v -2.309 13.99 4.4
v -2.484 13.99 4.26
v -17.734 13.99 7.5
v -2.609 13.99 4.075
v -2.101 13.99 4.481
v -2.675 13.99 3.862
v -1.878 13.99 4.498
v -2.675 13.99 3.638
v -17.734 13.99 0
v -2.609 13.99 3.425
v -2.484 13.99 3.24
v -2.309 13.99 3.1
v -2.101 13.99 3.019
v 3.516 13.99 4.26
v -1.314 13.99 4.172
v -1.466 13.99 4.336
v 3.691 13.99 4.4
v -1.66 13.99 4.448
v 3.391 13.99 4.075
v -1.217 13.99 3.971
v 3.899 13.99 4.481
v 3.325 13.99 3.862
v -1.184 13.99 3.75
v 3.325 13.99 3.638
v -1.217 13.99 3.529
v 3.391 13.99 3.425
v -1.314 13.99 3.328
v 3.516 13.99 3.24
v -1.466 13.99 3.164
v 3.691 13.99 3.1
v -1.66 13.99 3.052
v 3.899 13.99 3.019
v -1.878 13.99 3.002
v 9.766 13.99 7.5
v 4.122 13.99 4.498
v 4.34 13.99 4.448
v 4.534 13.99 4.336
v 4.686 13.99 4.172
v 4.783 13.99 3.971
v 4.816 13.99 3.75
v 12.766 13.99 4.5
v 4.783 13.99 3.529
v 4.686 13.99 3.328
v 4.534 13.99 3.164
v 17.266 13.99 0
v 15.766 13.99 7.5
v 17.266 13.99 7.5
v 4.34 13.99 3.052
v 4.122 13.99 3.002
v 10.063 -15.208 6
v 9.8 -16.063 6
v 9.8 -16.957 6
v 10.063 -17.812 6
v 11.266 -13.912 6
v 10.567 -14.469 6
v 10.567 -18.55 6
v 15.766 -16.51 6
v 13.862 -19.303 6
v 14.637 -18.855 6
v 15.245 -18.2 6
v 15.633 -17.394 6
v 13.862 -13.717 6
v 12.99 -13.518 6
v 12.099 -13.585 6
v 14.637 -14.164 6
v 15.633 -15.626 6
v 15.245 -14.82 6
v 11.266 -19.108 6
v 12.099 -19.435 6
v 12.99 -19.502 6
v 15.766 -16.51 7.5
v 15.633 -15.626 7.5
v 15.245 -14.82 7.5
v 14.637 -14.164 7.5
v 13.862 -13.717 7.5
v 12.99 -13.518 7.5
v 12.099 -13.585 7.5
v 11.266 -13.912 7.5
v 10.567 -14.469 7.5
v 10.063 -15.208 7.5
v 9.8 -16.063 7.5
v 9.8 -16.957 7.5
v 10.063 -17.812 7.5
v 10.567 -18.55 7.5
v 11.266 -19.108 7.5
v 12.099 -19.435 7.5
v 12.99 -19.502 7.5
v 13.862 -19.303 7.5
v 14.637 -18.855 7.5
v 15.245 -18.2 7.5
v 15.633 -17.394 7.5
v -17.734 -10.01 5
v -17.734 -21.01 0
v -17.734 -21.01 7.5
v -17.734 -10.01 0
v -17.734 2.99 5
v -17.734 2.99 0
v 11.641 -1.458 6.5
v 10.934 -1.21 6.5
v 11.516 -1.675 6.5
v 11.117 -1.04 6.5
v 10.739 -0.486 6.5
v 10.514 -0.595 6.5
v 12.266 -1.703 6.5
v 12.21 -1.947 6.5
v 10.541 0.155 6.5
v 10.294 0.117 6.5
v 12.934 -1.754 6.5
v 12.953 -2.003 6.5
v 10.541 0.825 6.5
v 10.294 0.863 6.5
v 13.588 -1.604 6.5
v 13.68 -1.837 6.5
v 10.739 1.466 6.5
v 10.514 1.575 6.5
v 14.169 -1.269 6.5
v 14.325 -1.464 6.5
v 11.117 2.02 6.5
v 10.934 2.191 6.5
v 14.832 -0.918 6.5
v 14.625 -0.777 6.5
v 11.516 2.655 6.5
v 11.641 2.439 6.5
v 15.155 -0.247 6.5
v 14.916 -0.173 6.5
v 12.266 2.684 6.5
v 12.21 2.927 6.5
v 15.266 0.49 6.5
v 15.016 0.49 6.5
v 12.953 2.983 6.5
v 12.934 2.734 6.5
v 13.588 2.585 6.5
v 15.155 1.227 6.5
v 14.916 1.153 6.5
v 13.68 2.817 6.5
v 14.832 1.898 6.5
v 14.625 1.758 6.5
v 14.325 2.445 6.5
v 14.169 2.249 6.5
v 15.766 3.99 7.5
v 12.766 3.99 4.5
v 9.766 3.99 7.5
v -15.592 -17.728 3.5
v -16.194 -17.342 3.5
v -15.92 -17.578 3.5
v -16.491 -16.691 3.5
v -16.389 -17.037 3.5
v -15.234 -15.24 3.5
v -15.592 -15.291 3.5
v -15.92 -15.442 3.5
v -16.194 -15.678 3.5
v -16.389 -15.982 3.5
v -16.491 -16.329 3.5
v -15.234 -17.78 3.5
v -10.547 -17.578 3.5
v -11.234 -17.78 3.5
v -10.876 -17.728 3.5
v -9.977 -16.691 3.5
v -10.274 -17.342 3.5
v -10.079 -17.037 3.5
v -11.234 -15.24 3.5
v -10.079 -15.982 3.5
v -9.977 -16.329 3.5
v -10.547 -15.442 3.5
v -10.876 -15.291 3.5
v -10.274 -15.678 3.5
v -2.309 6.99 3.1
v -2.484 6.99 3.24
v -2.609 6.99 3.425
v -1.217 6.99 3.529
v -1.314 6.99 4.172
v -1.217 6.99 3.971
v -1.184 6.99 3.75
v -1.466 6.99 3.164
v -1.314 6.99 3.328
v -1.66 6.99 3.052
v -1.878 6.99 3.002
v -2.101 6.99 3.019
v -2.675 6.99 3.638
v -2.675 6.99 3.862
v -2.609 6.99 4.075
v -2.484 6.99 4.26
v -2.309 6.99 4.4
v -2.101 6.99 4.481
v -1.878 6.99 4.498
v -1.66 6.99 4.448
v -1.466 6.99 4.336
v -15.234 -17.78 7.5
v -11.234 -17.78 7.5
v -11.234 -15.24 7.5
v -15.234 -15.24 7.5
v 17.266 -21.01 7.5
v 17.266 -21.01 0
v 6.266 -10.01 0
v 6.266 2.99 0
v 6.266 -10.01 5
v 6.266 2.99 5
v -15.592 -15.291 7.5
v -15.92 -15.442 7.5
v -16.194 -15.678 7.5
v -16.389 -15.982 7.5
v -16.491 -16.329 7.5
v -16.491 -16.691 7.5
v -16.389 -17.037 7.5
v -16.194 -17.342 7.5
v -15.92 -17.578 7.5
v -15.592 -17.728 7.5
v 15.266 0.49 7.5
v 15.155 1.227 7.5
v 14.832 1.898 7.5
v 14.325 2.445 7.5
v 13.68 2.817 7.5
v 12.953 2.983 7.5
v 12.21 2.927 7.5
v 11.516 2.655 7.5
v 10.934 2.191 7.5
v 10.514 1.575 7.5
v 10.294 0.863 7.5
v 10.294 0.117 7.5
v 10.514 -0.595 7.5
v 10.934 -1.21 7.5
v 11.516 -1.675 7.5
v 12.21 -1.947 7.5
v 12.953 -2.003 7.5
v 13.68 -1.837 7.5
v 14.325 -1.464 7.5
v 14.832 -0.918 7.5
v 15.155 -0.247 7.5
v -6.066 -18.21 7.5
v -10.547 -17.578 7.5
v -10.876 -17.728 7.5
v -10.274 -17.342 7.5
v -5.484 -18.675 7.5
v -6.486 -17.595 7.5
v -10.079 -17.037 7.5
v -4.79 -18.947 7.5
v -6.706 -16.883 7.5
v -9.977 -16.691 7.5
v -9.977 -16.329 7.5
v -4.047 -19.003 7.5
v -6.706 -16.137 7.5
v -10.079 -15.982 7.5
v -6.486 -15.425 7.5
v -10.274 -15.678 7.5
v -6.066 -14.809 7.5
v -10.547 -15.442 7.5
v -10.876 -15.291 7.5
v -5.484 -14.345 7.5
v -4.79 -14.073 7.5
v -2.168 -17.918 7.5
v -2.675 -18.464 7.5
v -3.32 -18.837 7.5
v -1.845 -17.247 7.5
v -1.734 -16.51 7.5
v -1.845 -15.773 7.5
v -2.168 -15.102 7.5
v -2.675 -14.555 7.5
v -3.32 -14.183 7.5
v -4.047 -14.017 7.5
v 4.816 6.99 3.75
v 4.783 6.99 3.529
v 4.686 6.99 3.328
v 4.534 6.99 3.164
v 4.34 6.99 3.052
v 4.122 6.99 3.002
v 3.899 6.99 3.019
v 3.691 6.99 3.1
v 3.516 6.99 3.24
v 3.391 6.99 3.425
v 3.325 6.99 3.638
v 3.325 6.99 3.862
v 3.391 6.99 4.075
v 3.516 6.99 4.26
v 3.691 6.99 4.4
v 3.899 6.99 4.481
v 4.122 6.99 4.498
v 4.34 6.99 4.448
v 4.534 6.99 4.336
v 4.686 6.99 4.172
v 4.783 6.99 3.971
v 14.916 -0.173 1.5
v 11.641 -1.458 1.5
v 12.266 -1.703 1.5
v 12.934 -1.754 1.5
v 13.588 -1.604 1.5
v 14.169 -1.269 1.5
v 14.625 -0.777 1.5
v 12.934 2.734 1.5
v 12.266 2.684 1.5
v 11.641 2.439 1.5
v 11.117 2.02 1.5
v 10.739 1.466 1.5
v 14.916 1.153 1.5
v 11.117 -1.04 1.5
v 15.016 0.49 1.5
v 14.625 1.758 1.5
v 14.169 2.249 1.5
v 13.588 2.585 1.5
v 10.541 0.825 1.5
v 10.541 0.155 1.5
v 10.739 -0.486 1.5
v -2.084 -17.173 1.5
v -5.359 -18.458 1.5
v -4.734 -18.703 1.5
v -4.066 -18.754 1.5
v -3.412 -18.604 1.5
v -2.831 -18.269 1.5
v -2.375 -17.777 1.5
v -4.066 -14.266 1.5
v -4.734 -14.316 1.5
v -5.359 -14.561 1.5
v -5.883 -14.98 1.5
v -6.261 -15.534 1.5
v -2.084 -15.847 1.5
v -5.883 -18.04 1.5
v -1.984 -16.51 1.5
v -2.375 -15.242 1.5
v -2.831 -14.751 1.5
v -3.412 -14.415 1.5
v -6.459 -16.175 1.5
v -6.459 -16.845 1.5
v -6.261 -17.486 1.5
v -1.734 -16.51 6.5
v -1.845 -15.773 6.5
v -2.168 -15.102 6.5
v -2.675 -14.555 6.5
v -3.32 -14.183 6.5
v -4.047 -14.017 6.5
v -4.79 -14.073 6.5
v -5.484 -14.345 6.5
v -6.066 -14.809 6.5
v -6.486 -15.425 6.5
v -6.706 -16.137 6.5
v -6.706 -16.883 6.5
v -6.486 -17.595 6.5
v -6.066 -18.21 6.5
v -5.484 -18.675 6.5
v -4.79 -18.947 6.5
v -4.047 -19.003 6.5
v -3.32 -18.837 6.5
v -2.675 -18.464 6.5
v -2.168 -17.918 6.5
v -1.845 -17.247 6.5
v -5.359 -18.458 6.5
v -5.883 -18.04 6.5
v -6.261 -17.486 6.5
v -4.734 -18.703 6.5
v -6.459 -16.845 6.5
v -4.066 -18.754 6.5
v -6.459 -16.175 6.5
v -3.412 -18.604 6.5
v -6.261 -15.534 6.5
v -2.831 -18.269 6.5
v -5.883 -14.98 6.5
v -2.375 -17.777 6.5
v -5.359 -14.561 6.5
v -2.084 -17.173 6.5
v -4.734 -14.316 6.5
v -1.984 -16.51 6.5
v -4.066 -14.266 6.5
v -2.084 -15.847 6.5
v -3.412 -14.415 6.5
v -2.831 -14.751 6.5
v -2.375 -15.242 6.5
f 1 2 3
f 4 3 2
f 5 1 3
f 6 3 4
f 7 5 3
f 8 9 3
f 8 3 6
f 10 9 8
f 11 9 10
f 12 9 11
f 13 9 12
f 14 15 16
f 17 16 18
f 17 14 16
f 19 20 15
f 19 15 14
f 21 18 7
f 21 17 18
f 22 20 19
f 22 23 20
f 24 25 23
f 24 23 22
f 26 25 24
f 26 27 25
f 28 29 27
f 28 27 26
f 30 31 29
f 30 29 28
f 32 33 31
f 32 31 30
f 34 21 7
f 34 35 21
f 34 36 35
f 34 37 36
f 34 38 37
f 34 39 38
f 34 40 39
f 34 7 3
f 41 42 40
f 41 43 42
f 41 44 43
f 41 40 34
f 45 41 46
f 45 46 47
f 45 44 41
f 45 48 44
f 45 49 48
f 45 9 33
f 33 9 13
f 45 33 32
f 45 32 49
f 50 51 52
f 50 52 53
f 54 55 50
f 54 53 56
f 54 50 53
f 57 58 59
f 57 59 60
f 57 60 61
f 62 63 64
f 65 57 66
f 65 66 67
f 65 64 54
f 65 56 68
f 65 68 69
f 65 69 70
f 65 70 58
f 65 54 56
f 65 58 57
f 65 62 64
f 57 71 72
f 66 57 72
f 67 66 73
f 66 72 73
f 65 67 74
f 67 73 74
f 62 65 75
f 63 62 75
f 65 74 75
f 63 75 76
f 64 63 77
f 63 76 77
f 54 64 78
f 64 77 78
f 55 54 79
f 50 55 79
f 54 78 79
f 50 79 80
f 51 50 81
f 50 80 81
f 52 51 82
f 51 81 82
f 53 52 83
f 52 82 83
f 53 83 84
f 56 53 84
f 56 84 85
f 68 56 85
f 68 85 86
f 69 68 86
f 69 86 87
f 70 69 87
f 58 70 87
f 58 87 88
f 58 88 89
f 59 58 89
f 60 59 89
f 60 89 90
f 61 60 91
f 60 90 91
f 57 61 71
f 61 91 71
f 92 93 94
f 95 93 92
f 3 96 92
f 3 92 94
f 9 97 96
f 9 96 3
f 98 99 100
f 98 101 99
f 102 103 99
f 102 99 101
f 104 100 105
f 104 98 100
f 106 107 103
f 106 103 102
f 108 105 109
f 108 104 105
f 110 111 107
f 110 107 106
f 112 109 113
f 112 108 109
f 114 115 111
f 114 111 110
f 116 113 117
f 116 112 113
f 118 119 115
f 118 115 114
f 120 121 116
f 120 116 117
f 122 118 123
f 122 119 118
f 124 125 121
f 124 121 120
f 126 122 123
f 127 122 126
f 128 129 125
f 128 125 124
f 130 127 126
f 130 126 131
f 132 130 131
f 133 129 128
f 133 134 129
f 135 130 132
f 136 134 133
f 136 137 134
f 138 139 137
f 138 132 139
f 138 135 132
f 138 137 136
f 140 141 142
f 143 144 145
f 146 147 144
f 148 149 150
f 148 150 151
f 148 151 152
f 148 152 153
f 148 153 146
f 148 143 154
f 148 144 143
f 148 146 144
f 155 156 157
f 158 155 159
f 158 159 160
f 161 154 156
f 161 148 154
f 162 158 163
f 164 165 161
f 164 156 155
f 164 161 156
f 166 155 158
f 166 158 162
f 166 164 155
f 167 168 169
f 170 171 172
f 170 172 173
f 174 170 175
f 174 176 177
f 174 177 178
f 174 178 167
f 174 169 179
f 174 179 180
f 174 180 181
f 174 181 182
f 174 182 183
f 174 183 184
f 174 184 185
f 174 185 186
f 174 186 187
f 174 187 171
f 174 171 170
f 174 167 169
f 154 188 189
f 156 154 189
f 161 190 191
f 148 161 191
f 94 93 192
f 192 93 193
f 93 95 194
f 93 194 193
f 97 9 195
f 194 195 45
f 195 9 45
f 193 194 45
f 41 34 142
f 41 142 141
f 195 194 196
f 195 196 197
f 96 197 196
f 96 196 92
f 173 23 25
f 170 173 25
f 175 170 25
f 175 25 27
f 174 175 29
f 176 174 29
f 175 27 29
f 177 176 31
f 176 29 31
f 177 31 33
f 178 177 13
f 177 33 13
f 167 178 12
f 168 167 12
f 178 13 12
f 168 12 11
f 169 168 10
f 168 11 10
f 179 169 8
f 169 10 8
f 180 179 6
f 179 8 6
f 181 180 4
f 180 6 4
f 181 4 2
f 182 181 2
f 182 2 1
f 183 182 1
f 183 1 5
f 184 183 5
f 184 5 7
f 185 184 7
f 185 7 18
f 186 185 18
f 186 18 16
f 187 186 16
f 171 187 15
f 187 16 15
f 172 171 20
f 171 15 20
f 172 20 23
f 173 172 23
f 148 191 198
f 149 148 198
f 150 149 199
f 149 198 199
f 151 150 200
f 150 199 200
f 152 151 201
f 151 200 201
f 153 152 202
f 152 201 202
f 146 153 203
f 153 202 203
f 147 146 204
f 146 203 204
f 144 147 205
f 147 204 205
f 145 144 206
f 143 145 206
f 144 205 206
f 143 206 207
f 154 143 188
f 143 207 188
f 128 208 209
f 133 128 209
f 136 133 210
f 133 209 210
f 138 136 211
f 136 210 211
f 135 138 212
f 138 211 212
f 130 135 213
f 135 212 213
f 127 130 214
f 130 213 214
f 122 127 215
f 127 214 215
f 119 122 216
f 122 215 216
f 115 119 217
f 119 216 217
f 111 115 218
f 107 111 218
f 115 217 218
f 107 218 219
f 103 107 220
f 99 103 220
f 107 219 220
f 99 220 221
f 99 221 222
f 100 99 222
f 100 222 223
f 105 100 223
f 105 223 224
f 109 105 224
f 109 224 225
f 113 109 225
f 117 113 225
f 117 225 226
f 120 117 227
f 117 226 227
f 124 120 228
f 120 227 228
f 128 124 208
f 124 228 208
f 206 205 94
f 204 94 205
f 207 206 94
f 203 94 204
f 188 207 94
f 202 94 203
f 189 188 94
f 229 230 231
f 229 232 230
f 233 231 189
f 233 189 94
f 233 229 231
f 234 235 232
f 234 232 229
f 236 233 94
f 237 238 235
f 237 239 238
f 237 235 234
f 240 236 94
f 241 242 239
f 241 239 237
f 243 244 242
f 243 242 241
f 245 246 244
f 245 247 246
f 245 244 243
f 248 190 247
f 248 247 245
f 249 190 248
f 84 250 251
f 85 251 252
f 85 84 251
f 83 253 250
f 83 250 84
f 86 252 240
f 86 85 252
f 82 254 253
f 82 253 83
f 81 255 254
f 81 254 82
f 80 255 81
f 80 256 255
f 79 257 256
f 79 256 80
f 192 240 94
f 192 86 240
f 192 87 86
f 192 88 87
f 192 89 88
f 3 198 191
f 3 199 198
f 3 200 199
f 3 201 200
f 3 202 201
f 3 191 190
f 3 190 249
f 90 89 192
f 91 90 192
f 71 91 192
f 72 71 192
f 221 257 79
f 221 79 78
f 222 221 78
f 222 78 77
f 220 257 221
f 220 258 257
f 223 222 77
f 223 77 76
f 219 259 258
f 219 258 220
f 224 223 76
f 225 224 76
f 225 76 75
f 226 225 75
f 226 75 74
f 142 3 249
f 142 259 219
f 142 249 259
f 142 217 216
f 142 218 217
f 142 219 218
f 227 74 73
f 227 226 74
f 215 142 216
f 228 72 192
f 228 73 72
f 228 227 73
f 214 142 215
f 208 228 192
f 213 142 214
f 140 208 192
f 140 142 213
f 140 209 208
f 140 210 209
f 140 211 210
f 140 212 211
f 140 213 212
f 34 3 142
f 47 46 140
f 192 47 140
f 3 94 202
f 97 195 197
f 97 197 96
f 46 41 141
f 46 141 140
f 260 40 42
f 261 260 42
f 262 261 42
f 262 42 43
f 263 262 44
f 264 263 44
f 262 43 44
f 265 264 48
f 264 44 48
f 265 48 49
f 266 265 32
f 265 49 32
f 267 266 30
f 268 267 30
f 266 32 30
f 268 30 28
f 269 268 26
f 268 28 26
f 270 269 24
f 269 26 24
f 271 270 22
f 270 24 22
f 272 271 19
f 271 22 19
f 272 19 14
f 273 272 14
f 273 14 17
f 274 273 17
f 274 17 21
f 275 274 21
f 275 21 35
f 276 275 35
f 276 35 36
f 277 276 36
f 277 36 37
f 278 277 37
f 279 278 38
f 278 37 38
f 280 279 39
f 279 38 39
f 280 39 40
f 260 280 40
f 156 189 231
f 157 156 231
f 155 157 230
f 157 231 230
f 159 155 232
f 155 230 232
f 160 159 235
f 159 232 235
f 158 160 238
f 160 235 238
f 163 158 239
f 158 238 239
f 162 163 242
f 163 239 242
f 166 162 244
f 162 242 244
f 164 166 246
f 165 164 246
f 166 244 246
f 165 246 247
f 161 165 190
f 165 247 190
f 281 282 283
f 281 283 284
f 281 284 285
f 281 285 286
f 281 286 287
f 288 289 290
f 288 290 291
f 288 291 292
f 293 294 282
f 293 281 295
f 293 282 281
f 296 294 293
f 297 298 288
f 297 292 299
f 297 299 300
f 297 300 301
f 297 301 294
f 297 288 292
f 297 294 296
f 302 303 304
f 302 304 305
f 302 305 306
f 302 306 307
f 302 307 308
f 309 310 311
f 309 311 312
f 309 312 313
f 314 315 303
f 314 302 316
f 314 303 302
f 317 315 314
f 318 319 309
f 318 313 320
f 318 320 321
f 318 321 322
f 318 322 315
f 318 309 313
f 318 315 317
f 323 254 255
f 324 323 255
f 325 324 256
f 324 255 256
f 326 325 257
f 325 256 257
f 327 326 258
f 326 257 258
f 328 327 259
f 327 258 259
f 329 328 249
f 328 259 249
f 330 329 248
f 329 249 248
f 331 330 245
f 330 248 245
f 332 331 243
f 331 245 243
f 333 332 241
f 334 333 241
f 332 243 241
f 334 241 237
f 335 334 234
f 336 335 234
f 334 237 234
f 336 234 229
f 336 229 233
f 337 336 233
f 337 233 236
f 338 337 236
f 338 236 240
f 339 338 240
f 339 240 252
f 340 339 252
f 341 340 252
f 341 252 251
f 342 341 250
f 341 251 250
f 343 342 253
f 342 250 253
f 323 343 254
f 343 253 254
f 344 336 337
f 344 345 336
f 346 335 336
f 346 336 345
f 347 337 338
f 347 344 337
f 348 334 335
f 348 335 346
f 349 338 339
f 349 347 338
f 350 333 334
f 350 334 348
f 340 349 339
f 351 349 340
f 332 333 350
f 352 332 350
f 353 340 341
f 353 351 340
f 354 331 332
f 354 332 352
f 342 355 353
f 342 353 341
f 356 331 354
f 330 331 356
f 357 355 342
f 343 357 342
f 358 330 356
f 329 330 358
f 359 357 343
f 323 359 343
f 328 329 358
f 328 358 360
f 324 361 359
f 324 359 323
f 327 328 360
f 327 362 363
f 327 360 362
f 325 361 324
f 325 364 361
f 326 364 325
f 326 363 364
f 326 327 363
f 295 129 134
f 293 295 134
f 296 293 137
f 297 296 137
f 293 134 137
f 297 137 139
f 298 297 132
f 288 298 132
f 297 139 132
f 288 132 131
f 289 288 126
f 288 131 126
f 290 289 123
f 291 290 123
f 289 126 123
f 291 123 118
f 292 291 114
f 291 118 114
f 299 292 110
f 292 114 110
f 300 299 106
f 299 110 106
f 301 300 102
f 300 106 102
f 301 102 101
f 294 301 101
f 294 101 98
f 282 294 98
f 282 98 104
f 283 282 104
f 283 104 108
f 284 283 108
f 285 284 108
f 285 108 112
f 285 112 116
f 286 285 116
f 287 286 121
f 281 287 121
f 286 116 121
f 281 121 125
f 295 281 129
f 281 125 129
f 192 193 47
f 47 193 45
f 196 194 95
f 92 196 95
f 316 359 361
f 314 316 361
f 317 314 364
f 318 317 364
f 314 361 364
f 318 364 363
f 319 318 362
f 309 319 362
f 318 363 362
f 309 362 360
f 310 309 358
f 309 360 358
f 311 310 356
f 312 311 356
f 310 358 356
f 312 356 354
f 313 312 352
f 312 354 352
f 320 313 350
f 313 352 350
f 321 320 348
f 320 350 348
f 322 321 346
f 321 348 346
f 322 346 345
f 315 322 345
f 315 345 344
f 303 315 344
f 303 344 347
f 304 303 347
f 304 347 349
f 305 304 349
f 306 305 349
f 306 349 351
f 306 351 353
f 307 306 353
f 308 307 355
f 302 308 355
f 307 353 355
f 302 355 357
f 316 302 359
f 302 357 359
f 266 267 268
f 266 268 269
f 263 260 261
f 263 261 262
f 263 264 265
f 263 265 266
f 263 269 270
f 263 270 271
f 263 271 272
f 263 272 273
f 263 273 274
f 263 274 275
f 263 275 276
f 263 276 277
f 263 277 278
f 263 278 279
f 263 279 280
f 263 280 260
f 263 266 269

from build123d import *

# Parameters (mm, degrees)
SKETCH1_W           = 35
SKETCH1_H           = 35
BOSS_EXTRUDE1_DEPTH = 7.5
SKETCH2_W           = 24
SKETCH2_H           = 13
CUT_EXTRUDE2_DEPTH  = 5
SKETCH10_R          = 0.75
CUT_EXTRUDE7_DEPTH  = 7
SKETCH5_R           = 2.5
CUT_EXTRUDE11_DEPTH = 1
SKETCH11_R          = 2.25
CUT_EXTRUDE12_DEPTH = 5
CUT_EXTRUDE13_DEPTH = 10
CUT_EXTRUDE14_DEPTH = 10
CUT_EXTRUDE15_DEPTH = 4
BOSS_EXTRUDE2_DEPTH = 10
SKETCH17_R          = 3
CUT_EXTRUDE16_DEPTH = 1.5


with BuildPart() as part:
    # Sketch1 → Boss-Extrude1 (new body)
    with BuildSketch(Plane.XY):
        with Locations((-0.233740073, -3.509910016)):
            Rectangle(SKETCH1_W, SKETCH1_H)
    extrude(amount=BOSS_EXTRUDE1_DEPTH)

    # Sketch2 → Cut-Extrude2 (cut)
    with BuildSketch(Plane(origin=(0, 0, 0), x_dir=(-1, 0, 0), z_dir=(0, 0, -1))):
        with Locations((5.733740073, -3.509910016)):
            Rectangle(SKETCH2_W, SKETCH2_H)
    extrude(amount=-CUT_EXTRUDE2_DEPTH, mode=Mode.SUBTRACT)

    # Sketch10 → Cut-Extrude7 (cut)
    with BuildSketch(Plane(origin=(0, 13.990089984, 0), x_dir=(1, 0, 0), z_dir=(0, 1, 0))):
        with Locations((4.066259927, -3.75)):
            Circle(SKETCH10_R)
        with Locations((-1.933740073, -3.75)):
            Circle(SKETCH10_R)
    extrude(amount=-CUT_EXTRUDE7_DEPTH, mode=Mode.SUBTRACT)

    # Sketch5 → Cut-Extrude11 (cut)
    with BuildSketch(Plane.XY.offset(7.5)):
        with Locations((12.766259927, 0.490089984)):
            Circle(SKETCH5_R)
        with Locations((-4.233740073, -16.509910016)):
            Circle(SKETCH5_R)
    extrude(amount=-CUT_EXTRUDE11_DEPTH, mode=Mode.SUBTRACT)

    # Sketch11 → Cut-Extrude12 (cut)
    with BuildSketch(Plane.XY.offset(6.5)):
        with Locations((-4.233740073, -16.509910016)):
            Circle(SKETCH11_R)
        with Locations((12.766259927, 0.490089984)):
            Circle(SKETCH11_R)
    extrude(amount=-CUT_EXTRUDE12_DEPTH, mode=Mode.SUBTRACT)

    # Sketch13 → Cut-Extrude13 (cut)
    with BuildSketch(Plane.XZ.offset(21.009910016)):
        Polygon((9.766259927, 7.5), (12.766259927, 4.5), (15.766259927, 7.5), align=None)
    extrude(amount=-CUT_EXTRUDE13_DEPTH, mode=Mode.SUBTRACT)

    # Sketch15 → Cut-Extrude14 (cut)
    with BuildSketch(Plane(origin=(0, 13.990089984, 0), x_dir=(1, 0, 0), z_dir=(0, 1, 0))):
        Polygon((9.766259927, -7.5), (12.766259927, -4.5), (15.766259927, -7.5), align=None)
    extrude(amount=-CUT_EXTRUDE14_DEPTH, mode=Mode.SUBTRACT)

    # Sketch4 → Cut-Extrude15 (cut)
    with BuildSketch(Plane.XY.offset(7.5)):
        with BuildLine():
            Line((-11.233740073, -15.239910016), (-15.233740073, -15.239910016))
            ThreePointArc((-15.233740073, -15.239910016), (-16.503740073, -16.509910016), (-15.233740073, -17.779910016))
            Line((-15.233740073, -17.779910016), (-11.233740073, -17.779910016))
            ThreePointArc((-11.233740073, -17.779910016), (-9.963740073, -16.509910016), (-11.233740073, -15.239910016))
        make_face()
    extrude(amount=-CUT_EXTRUDE15_DEPTH, mode=Mode.SUBTRACT)

    # Sketch16 → Boss-Extrude2 (add)
    with BuildSketch(Plane(origin=(0, -11.009910016, 0), x_dir=(-1, 0, 0), z_dir=(0, -1, 0))):
        Polygon((-9.766259927, -7.5), (-15.766259927, -7.5), (-12.766259927, -4.5), align=None)
    extrude(amount=BOSS_EXTRUDE2_DEPTH)

    # Sketch17 → Cut-Extrude16 (cut)
    with BuildSketch(Plane.XY.offset(7.5)):
        with Locations((12.766259927, -16.509910016)):
            Circle(SKETCH17_R)
    extrude(amount=-CUT_EXTRUDE16_DEPTH, mode=Mode.SUBTRACT)


solid = part.part
